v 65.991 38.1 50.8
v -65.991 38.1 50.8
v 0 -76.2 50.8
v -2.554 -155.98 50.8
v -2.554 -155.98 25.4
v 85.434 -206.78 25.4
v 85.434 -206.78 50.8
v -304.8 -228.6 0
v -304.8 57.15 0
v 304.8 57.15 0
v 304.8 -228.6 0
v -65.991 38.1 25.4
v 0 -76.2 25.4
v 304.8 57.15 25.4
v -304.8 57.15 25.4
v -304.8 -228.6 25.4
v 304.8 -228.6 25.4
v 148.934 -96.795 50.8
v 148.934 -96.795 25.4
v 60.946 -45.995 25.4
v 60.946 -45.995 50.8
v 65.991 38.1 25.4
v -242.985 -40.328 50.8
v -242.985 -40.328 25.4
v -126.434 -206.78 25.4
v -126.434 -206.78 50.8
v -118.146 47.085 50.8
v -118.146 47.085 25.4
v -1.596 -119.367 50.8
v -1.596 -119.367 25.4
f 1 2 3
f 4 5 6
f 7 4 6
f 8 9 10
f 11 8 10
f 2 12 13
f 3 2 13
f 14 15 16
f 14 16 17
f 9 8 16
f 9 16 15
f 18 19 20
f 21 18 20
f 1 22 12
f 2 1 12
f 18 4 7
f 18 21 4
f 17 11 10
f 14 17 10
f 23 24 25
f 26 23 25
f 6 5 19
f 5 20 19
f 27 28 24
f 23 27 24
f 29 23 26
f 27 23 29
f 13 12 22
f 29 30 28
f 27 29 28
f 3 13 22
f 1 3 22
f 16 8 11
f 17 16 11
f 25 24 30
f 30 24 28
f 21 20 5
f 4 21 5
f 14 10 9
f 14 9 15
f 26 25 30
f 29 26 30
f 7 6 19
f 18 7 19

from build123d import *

# Parameters (mm, degrees)
F0_W     = 609.6
F0_H     = 457.2
F1_DEPTH = 25.4
F3_DEPTH = 25.4
F4_W     = 171.45
F4_H     = 25.4
F5_DEPTH = 609.601


with BuildPart() as f1:
    # F0 (on Top) → F1 (new body)
    with BuildSketch(Plane.XY):
        Rectangle(F0_W, F0_H)
    extrude(amount=F1_DEPTH)

    # F4 (on face) → F5 (cut, through all)
    with BuildSketch(Plane.YZ.offset(304.8)):
        with Locations((142.875, 12.7)):
            Rectangle(F4_W, F4_H)
    extrude(amount=-F5_DEPTH, mode=Mode.SUBTRACT)


with BuildPart() as f3:
    # F2 (on face) → F3 (new body)
    with BuildSketch(Plane.XY.offset(25.4)):
        Polygon((0, -76.2), (65.991136, 38.1), (-65.991136, 38.1), align=None)
        Polygon((-118.146342, 47.08458), (-242.985113, -40.328469), (-126.434381, -206.780165), (-1.59561, -119.367116), align=None)
        Polygon((-2.554, -155.980165), (85.434181, -206.780165), (148.934181, -96.794938), (60.946, -45.994938), align=None)
    extrude(amount=F3_DEPTH)


solid = Compound([f1.part, f3.part])
